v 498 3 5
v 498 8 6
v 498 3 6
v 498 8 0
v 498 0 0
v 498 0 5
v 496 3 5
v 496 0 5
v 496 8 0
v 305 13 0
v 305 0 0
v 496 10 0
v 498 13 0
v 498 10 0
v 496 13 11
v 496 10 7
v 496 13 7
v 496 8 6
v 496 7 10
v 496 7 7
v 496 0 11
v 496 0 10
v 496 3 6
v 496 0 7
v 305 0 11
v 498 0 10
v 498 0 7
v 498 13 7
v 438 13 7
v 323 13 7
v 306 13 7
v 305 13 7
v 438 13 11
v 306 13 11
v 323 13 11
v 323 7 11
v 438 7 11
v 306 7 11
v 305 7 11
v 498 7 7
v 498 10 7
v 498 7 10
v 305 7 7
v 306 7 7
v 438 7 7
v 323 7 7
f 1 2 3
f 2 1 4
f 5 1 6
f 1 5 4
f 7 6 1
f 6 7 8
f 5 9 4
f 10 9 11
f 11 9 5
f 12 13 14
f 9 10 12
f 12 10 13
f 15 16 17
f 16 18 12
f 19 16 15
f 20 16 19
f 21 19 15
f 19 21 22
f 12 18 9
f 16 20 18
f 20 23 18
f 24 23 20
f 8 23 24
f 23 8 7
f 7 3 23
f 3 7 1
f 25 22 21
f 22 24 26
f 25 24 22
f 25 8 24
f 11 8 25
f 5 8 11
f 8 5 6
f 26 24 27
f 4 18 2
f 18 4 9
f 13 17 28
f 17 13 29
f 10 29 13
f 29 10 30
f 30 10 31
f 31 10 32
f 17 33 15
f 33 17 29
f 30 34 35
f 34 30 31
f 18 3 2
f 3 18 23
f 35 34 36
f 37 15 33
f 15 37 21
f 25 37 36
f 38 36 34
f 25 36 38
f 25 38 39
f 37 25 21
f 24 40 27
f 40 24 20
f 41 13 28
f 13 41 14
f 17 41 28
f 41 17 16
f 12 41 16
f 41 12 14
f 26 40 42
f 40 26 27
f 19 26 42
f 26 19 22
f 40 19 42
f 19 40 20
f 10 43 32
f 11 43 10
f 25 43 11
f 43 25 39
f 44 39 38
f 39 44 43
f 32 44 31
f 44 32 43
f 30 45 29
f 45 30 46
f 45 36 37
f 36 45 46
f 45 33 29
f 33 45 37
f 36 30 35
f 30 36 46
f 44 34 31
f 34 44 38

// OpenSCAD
translate([497.0, 1.5, 2.5]) color([0.1372879505883815, 0.015498761483451418, 0.5048497045627587]) cube([2, 3, 5], center=true);
translate([497.0, 5.5, 1.5]) color([0.36698725510709684, 0.6348155217266559, 0.811995686067811]) cube([2, 5, 3], center=true);
translate([443.5, 12.0, 2.5]) color([0.8768405645756486, 0.1552431358080847, 0.1767648869043179]) cube([3, 2, 5], center=true);
translate([497.0, 5.5, 4.5]) color([0.991228648099722, 0.13558077637136434, 0.20650423900368708]) cube([2, 5, 3], center=true);
translate([444.5, 12.0, 6.5]) color([0.9151210693627757, 0.49673738754911745, 0.7672539256192649]) cube([5, 2, 3], center=true);
translate([444.5, 8.5, 8.0]) color([0.969306850533619, 0.23531586477578126, 0.13212860983739783]) cube([5, 3, 2], center=true);
translate([443.5, 9.5, 10.0]) color([0.23368957459901674, 0.38460662479298113, 0.6084990843462054]) cube([3, 5, 2], center=true);
translate([444.5, 3.5, 8.5]) color([0.1325407149567407, 0.4984659545183915, 0.9178662904203972]) cube([5, 7, 3], center=true);
translate([488.5, 2.5, 3.5]) color([0.6160167741323543, 0.02601445858505036, 0.596125612844632]) cube([3, 5, 7], center=true);
translate([488.5, 7.5, 3.5]) color([0.48919913512172475, 0.30869925031539414, 0.9586301909392594]) cube([3, 5, 7], center=true);
translate([489.5, 11.5, 3.5]) color([0.5555224541780607, 0.16303723797834868, 0.8790785483620981]) cube([5, 3, 7], center=true);
translate([489.5, 3.5, 8.5]) color([0.8092366229990562, 0.7373715302416316, 0.5460288399006699]) cube([5, 7, 3], center=true);
translate([491.5, 2.5, 3.5]) color([0.7042240787132147, 0.07877233817546292, 0.13744427713979768]) cube([3, 5, 7], center=true);
translate([491.5, 7.5, 3.5]) color([0.40185422229333856, 0.1910666288561843, 0.31642065037316636]) cube([3, 5, 7], center=true);
translate([494.5, 2.5, 3.5]) color([0.2917281417853558, 0.9437754009602987, 0.20866341172373193]) cube([3, 5, 7], center=true);
translate([494.5, 7.5, 3.5]) color([0.3151573145870893, 0.7470721078045024, 0.24960896628473228]) cube([3, 5, 7], center=true);
translate([495.5, 11.5, 3.5]) color([0.8629627260654799, 0.6684326881602258, 0.6597695027130189]) cube([5, 3, 7], center=true);
translate([495.5, 3.5, 8.5]) color([0.22591717735012307, 0.3441717078654829, 0.16233220178561225]) cube([5, 7, 3], center=true);
translate([444.5, 5.5, 3.5]) color([0.01697652307419406, 0.5735931064152219, 0.05818297514553228]) cube([5, 11, 7], center=true);
translate([449.5, 3.5, 5.5]) color([0.6304378073753134, 0.35341956482818127, 0.49110709598533775]) cube([5, 7, 11], center=true);
translate([454.5, 3.5, 5.5]) color([0.06132304686728618, 0.24146702174069912, 0.012441234482642782]) cube([5, 7, 11], center=true);
translate([459.5, 3.5, 5.5]) color([0.9455344576677447, 0.3266678829978785, 0.820956849026723]) cube([5, 7, 11], center=true);
translate([464.5, 3.5, 5.5]) color([0.34492851027915805, 0.6639756368298299, 0.13585073420724958]) cube([5, 7, 11], center=true);
translate([469.5, 3.5, 5.5]) color([0.9219835342207869, 0.44896684911260887, 0.1420549627992148]) cube([5, 7, 11], center=true);
translate([454.5, 10.0, 3.5]) color([0.3119518323014343, 0.6490756968320398, 0.7280642389267371]) cube([5, 6, 7], center=true);
translate([459.5, 10.0, 3.5]) color([0.7852833252199665, 0.40863068686923587, 0.009633238682779877]) cube([5, 6, 7], center=true);
translate([464.5, 10.0, 3.5]) color([0.8909238596539266, 0.533705581213062, 0.8046005274030336]) cube([5, 6, 7], center=true);
translate([469.5, 10.0, 3.5]) color([0.9806276909012095, 0.7049346898693578, 0.7590860206033218]) cube([5, 6, 7], center=true);
translate([474.5, 3.5, 5.5]) color([0.5647284680717275, 0.12259546226958773, 0.9539533584587191]) cube([5, 7, 11], center=true);
translate([474.5, 10.0, 3.5]) color([0.1713156178825357, 0.5005542720722199, 0.621843985236089]) cube([5, 6, 7], center=true);
translate([479.5, 3.5, 5.5]) color([0.6619765424276485, 0.8400519693824264, 0.699601591737329]) cube([5, 7, 11], center=true);
translate([479.5, 10.0, 3.5]) color([0.07964741684534404, 0.23738047361475634, 0.8282556520451495]) cube([5, 6, 7], center=true);
translate([484.5, 3.5, 5.5]) color([0.1762738246231843, 0.9459581227747745, 0.9565644324307663]) cube([5, 7, 11], center=true);
translate([484.5, 10.0, 3.5]) color([0.8963269305888116, 0.7428117304122551, 0.8383436924491765]) cube([5, 6, 7], center=true);
translate([352.5, 6.5, 2.5]) color([0.5614087817692366, 0.7177928021437573, 0.4271772721979724]) cube([7, 13, 5], center=true);
translate([308.5, 3.5, 5.5]) color([0.8646648421725511, 0.10365846470378459, 0.6285317276232824]) cube([7, 7, 11], center=true);
translate([308.5, 10.0, 3.5]) color([0.7101075213407797, 0.6149371087697887, 0.0400488022899097]) cube([7, 6, 7], center=true);
translate([315.5, 3.5, 5.5]) color([0.34025031183581533, 0.7380159626358669, 0.3765176313166855]) cube([7, 7, 11], center=true);
translate([315.5, 10.0, 3.5]) color([0.6257641682954356, 0.8894786539399329, 0.4963449395419606]) cube([7, 6, 7], center=true);
translate([322.5, 3.5, 5.5]) color([0.3583651728386771, 0.6716454412848432, 0.45811681625355094]) cube([7, 7, 11], center=true);
translate([322.5, 10.0, 3.5]) color([0.5074379917667022, 0.16228475224599026, 0.7529781863444399]) cube([7, 6, 7], center=true);
translate([329.5, 3.5, 5.5]) color([0.3376457636791449, 0.8033239356600728, 0.9444207727357242]) cube([7, 7, 11], center=true);
translate([329.5, 10.0, 3.5]) color([0.014783921172948133, 0.5303420268039528, 0.2882277186993394]) cube([7, 6, 7], center=true);
translate([336.5, 3.5, 5.5]) color([0.4689175335863792, 0.03492832759702502, 0.5317931441254861]) cube([7, 7, 11], center=true);
translate([336.5, 10.0, 3.5]) color([0.552095437515129, 0.9340898594770107, 0.03830085289416996]) cube([7, 6, 7], center=true);
translate([343.5, 3.5, 5.5]) color([0.3950652682884612, 0.1200155720396251, 0.34658884626630715]) cube([7, 7, 11], center=true);
translate([343.5, 10.0, 3.5]) color([0.051152415727703016, 0.2730496953424699, 0.9956802504828091]) cube([7, 6, 7], center=true);
translate([350.5, 3.5, 5.5]) color([0.25391998649183944, 0.6803935586065328, 0.7027090324157298]) cube([7, 7, 11], center=true);
translate([350.5, 10.0, 3.5]) color([0.9291230685247301, 0.9949404722907454, 0.7620813713006523]) cube([7, 6, 7], center=true);
translate([357.5, 3.5, 5.5]) color([0.7625973189567923, 0.5162610213479427, 0.3860717563215982]) cube([7, 7, 11], center=true);
translate([357.5, 10.0, 3.5]) color([0.8343975914408754, 0.2506337702942619, 0.11599539642064438]) cube([7, 6, 7], center=true);
translate([364.5, 3.5, 5.5]) color([0.9817240858781537, 0.8047994372884794, 0.9431012043694105]) cube([7, 7, 11], center=true);
translate([364.5, 10.0, 3.5]) color([0.24264659424234813, 0.6738638931519124, 0.5327800265053269]) cube([7, 6, 7], center=true);
translate([371.5, 3.5, 5.5]) color([0.8756440829735669, 0.16255101499230828, 0.8680483691353614]) cube([7, 7, 11], center=true);
translate([371.5, 10.0, 3.5]) color([0.15305579700066485, 0.8462165202751376, 0.8200801239095041]) cube([7, 6, 7], center=true);
translate([378.5, 3.5, 5.5]) color([0.5849326984313064, 0.05125489506773162, 0.156166769208809]) cube([7, 7, 11], center=true);
translate([378.5, 10.0, 3.5]) color([0.34458118202681143, 0.291190613997825, 0.29342424365134856]) cube([7, 6, 7], center=true);
translate([385.5, 3.5, 5.5]) color([0.49485912757206985, 0.40365829021262367, 0.43100562682353716]) cube([7, 7, 11], center=true);
translate([385.5, 10.0, 3.5]) color([0.17003546655932655, 0.788340085303476, 0.5686027559906347]) cube([7, 6, 7], center=true);
translate([392.5, 3.5, 5.5]) color([0.44188886974638586, 0.3413461590512491, 0.009317740415098474]) cube([7, 7, 11], center=true);
translate([392.5, 10.0, 3.5]) color([0.72162474304745, 0.9099060293040379, 0.6642090292154819]) cube([7, 6, 7], center=true);
translate([399.5, 3.5, 5.5]) color([0.6628365798191557, 0.2575988974219705, 0.6122127561841502]) cube([7, 7, 11], center=true);
translate([399.5, 10.0, 3.5]) color([0.07024606726227145, 0.936077955543095, 0.27870721332570936]) cube([7, 6, 7], center=true);
translate([406.5, 3.5, 5.5]) color([0.8301443917589898, 0.5295296249528143, 0.06328696503387199]) cube([7, 7, 11], center=true);
translate([406.5, 10.0, 3.5]) color([0.639390097241117, 0.579686955437464, 0.9416538141960143]) cube([7, 6, 7], center=true);
translate([413.5, 3.5, 5.5]) color([0.6321291610349786, 0.5434228748459046, 0.38469874676133664]) cube([7, 7, 11], center=true);
translate([413.5, 10.0, 3.5]) color([0.434637548519362, 0.31139777068021024, 0.01363511702942577]) cube([7, 6, 7], center=true);
translate([420.5, 3.5, 5.5]) color([0.7785312160167684, 0.8197509625398982, 0.28044077713976767]) cube([7, 7, 11], center=true);
translate([420.5, 10.0, 3.5]) color([0.2581907625337724, 0.5272652548146236, 0.3179301097250754]) cube([7, 6, 7], center=true);
translate([427.5, 3.5, 5.5]) color([0.3422638341038545, 0.7055726929201963, 0.43169639849300545]) cube([7, 7, 11], center=true);
translate([427.5, 10.0, 3.5]) color([0.14170724037842175, 0.0059275683019511805, 0.5113413643489257]) cube([7, 6, 7], center=true);
translate([434.5, 3.5, 5.5]) color([0.7846494738841625, 0.7013909140505133, 0.7815279332048084]) cube([7, 7, 11], center=true);
translate([434.5, 10.0, 3.5]) color([0.38414456219182536, 0.4641305725985776, 0.036369164001931575]) cube([7, 6, 7], center=true);
translate([441.5, 6.5, 5.5]) color([0.9124290899309246, 0.6366653413633517, 0.798477007479407]) cube([7, 13, 11], center=true);
translate([453.5, 6.5, 5.5]) color([0.7602358551941967, 0.899814300356001, 0.3622224295816935]) cube([17, 13, 11], center=true);
translate([470.5, 6.5, 5.5]) color([0.9815510059994267, 0.15851660579635174, 0.19450942151924966]) cube([17, 13, 11], center=true);
translate([487.5, 6.5, 5.5]) color([0.35447317829590397, 0.700089123077614, 0.019141470871264166]) cube([17, 13, 11], center=true);
translate([314.5, 6.5, 5.5]) color([0.7352582011311831, 0.5715587801616956, 0.24207966979200135]) cube([17, 13, 11], center=true);
